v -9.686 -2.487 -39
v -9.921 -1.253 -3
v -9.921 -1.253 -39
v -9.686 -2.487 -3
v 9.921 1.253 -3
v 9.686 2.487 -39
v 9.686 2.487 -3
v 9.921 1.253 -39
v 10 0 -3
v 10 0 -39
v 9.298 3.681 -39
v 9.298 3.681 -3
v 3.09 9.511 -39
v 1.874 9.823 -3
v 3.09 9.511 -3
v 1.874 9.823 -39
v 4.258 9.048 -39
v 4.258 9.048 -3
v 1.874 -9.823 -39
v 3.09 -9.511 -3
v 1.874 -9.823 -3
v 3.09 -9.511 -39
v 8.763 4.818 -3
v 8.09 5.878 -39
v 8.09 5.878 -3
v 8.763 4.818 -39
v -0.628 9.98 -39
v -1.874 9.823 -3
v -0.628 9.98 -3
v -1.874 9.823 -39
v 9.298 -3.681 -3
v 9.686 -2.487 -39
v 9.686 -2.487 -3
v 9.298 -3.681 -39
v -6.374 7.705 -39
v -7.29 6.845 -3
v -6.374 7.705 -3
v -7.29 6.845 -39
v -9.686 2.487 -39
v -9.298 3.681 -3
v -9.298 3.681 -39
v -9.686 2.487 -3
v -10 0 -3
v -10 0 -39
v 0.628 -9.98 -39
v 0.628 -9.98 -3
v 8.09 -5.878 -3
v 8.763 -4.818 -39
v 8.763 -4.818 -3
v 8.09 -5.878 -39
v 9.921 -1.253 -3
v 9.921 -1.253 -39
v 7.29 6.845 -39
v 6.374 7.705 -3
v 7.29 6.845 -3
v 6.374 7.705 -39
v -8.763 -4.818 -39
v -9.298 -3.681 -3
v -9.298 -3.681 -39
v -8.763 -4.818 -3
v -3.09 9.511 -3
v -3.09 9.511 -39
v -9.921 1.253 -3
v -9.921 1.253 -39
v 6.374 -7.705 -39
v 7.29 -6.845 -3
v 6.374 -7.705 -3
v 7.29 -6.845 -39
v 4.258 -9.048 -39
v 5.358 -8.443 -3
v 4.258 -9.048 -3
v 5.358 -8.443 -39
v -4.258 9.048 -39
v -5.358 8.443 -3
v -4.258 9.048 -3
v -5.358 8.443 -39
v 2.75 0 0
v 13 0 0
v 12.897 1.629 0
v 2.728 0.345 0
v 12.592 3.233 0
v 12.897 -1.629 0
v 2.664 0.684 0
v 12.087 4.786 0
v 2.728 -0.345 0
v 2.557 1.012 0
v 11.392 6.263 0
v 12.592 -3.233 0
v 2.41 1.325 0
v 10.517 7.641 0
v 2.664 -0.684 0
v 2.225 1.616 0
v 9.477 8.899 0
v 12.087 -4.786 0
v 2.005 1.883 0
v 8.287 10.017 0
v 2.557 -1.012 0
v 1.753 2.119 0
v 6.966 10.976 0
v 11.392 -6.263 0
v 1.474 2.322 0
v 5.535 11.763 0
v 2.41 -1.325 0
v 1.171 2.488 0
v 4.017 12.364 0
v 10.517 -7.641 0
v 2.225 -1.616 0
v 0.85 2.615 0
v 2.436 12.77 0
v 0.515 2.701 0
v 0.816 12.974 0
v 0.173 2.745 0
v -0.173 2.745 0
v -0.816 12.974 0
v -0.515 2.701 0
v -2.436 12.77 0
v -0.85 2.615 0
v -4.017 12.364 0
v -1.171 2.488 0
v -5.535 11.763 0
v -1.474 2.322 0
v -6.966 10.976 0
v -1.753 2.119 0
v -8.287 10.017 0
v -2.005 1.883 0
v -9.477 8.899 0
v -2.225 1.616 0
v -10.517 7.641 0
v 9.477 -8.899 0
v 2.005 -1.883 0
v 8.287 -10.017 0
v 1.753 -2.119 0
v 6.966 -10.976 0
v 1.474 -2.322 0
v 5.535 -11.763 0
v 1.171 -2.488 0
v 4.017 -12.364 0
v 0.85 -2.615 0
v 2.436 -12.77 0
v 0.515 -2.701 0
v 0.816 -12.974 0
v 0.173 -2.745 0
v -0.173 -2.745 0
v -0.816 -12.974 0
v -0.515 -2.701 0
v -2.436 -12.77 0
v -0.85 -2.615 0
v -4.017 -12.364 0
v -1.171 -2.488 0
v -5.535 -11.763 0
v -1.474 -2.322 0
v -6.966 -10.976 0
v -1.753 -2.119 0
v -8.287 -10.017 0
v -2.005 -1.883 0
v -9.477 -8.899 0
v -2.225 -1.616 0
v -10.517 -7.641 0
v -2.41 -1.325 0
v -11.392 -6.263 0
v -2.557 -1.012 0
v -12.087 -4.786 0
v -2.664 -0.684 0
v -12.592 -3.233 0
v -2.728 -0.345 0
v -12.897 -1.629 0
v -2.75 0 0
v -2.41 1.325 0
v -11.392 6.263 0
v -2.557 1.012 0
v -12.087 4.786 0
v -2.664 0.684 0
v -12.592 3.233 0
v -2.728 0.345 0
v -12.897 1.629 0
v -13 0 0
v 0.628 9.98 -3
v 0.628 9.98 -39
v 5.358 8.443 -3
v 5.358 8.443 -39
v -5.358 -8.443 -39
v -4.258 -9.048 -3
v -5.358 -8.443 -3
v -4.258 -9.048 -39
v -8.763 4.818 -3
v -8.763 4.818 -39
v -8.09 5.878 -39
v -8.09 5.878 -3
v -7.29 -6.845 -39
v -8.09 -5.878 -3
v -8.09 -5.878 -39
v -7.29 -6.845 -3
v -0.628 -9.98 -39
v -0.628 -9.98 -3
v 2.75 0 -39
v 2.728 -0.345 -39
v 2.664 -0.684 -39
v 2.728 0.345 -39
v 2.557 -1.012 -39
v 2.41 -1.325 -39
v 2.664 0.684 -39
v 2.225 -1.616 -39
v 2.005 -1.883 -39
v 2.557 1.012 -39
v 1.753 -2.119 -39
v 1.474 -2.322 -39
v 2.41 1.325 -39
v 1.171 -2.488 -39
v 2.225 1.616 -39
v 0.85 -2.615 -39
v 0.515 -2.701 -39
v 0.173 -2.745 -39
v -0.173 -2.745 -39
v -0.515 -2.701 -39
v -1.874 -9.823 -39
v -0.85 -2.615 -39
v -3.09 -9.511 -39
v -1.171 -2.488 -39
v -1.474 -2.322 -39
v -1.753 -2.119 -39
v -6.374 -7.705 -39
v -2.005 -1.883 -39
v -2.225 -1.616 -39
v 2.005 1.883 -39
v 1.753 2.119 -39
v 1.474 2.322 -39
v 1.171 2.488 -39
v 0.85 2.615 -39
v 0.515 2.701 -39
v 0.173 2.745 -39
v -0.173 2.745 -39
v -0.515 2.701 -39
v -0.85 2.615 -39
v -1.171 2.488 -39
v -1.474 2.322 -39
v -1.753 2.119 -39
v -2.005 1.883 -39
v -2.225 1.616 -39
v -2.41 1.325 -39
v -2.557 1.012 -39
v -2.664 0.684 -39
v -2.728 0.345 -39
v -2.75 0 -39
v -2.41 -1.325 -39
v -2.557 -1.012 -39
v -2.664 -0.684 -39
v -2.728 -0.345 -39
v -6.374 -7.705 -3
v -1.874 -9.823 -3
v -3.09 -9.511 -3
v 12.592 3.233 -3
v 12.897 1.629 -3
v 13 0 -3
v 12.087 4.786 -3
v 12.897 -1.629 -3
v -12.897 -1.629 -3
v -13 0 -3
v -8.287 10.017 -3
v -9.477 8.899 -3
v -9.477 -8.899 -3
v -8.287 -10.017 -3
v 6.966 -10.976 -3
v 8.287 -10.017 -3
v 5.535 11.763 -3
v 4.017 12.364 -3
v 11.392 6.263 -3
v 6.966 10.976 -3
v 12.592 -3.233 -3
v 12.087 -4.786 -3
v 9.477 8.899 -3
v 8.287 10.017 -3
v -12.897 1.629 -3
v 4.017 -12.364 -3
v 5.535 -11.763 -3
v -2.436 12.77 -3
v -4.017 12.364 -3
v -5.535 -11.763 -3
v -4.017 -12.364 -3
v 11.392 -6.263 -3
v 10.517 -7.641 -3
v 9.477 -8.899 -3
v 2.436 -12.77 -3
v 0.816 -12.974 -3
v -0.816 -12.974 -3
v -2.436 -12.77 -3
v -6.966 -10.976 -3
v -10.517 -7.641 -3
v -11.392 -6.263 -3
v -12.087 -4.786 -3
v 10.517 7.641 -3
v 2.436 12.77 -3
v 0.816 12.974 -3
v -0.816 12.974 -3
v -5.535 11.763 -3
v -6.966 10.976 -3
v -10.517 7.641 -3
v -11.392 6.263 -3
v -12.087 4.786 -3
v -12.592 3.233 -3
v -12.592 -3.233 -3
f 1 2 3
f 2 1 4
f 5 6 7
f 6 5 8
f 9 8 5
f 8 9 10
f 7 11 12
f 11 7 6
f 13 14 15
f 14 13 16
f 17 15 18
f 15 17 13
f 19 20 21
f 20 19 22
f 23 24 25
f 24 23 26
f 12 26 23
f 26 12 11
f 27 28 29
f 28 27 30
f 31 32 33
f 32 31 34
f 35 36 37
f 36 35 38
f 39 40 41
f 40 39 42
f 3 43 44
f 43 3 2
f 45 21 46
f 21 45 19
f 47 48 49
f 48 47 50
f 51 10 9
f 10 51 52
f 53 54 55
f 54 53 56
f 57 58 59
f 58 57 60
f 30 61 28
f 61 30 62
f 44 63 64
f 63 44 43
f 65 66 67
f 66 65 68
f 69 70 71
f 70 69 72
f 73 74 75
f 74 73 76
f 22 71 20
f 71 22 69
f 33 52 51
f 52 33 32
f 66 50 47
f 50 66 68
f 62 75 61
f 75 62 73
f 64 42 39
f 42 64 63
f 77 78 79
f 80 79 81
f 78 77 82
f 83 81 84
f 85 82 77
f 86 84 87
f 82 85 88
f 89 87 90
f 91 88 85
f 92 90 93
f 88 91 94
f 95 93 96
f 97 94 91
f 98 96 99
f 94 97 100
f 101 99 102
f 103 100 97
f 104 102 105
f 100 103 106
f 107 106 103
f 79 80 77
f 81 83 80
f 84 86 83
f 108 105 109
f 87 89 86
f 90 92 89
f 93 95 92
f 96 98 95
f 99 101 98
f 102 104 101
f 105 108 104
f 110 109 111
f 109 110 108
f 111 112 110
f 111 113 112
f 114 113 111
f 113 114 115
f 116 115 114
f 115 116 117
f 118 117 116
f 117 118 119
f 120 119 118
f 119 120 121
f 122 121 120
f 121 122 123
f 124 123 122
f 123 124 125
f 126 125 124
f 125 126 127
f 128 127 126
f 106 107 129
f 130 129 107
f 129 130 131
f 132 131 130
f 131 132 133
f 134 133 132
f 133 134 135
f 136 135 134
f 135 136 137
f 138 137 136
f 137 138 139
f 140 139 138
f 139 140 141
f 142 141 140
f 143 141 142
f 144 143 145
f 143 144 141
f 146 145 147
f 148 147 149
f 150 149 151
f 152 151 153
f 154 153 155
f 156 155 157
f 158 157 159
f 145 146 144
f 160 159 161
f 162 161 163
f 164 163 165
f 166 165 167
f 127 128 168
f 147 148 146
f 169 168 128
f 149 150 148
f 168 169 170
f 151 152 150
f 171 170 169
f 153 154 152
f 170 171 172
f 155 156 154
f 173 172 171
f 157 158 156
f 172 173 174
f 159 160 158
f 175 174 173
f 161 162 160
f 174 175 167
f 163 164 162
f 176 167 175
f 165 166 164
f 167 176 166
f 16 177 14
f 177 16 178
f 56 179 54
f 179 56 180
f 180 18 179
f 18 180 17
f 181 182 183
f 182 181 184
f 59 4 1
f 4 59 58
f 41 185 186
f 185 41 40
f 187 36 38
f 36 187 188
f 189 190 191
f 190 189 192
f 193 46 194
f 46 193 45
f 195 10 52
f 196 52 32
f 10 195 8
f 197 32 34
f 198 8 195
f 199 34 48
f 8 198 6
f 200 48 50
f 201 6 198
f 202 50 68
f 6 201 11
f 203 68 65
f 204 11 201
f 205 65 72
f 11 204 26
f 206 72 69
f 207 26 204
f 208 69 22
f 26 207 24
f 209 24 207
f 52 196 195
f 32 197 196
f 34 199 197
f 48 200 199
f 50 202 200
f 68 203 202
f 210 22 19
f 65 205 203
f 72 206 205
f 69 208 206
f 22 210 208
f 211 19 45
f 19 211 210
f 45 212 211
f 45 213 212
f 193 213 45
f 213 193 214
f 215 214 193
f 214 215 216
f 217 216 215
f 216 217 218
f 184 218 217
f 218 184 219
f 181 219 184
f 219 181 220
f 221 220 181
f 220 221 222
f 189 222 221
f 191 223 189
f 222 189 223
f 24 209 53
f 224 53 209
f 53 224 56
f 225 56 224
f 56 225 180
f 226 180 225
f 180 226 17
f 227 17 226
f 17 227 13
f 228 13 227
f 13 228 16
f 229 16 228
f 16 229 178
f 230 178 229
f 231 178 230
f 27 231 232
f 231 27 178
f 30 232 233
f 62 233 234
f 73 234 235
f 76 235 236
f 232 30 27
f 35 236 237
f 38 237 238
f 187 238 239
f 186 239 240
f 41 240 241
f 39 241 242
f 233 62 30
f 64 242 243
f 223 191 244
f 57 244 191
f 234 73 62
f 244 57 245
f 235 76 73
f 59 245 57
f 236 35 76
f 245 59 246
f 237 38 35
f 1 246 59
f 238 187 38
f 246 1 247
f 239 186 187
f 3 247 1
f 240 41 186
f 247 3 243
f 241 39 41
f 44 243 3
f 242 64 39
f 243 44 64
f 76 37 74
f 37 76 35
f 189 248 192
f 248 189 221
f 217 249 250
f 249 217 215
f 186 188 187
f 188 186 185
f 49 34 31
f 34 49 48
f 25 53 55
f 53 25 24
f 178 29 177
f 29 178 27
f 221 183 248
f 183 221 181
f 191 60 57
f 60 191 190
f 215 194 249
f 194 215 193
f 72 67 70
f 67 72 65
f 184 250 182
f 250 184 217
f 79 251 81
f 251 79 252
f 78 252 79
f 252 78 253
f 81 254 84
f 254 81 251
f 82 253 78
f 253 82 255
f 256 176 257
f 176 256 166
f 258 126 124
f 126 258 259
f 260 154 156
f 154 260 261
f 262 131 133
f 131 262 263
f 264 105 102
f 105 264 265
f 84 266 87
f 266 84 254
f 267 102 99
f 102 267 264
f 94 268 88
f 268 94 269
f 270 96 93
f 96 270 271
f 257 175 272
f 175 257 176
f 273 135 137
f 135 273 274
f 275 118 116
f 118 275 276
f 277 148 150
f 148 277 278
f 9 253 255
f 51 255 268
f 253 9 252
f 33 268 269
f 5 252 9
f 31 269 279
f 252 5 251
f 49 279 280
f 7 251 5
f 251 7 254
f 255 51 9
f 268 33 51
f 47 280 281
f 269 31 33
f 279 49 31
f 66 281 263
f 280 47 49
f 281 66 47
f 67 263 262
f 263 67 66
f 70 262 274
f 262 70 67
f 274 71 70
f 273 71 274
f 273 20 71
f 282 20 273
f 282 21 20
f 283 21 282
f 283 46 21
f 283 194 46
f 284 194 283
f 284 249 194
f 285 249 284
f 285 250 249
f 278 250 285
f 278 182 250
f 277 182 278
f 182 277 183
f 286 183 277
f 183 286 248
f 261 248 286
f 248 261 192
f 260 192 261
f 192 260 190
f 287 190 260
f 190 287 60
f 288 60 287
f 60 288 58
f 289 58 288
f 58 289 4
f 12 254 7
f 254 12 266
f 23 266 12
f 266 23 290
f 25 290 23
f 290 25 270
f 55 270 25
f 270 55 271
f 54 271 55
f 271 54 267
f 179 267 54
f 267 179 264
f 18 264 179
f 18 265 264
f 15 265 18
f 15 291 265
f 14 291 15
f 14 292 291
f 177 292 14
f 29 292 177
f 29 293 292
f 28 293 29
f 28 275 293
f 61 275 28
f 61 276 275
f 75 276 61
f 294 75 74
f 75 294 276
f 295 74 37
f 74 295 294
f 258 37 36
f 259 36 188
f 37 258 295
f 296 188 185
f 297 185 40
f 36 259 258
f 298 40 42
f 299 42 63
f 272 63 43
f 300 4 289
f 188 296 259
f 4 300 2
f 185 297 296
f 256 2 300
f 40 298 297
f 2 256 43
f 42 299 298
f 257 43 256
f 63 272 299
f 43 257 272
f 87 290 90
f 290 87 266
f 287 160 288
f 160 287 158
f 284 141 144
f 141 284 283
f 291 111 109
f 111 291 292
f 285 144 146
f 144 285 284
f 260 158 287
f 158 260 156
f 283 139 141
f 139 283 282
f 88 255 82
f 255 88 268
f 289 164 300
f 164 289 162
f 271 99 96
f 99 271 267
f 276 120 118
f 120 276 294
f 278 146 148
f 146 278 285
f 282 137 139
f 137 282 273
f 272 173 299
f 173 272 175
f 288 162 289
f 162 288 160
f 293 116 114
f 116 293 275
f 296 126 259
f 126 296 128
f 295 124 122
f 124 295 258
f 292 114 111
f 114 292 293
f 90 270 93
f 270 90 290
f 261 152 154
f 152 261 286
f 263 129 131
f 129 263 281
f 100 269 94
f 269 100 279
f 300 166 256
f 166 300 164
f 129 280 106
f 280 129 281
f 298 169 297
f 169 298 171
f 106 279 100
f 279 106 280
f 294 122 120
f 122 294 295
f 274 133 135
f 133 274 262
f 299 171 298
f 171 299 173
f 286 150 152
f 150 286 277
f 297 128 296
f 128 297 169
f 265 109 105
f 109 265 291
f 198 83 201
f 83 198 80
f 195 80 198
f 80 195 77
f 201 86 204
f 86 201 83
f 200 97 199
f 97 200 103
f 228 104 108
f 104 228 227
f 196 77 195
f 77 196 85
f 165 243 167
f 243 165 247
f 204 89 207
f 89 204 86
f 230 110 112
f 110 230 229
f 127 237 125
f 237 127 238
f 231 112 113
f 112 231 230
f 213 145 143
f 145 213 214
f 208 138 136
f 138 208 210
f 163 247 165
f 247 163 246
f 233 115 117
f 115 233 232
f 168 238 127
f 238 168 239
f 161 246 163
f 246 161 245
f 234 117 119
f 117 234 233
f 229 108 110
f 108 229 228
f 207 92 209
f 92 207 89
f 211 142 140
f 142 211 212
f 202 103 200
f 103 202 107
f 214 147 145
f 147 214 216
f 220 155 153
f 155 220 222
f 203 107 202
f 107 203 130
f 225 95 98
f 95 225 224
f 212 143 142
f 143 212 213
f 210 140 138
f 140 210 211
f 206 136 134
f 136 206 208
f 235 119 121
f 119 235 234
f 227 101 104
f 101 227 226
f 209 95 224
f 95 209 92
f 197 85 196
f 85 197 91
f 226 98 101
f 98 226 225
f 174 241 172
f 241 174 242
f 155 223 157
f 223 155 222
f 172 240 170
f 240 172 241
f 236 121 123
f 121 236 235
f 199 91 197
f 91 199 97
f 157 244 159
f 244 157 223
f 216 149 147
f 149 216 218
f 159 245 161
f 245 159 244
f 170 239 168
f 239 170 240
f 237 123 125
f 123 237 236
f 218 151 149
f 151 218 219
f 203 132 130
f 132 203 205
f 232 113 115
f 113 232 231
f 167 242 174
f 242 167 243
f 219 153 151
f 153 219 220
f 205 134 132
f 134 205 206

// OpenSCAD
$fn = 50;


difference() {
	union() {
		translate(v = [0, 0, -39.0000000000]) {
			cylinder(h = 39, r = 10.0000000000);
		}
		translate(v = [0, 0, -3.0000000000]) {
			cylinder(h = 3, r = 13.0000000000);
		}
	}
	union() {
		#translate(v = [0, 0, -39]) {
			cylinder(h = 39, r = 2.7500000000);
		}
	}
}
